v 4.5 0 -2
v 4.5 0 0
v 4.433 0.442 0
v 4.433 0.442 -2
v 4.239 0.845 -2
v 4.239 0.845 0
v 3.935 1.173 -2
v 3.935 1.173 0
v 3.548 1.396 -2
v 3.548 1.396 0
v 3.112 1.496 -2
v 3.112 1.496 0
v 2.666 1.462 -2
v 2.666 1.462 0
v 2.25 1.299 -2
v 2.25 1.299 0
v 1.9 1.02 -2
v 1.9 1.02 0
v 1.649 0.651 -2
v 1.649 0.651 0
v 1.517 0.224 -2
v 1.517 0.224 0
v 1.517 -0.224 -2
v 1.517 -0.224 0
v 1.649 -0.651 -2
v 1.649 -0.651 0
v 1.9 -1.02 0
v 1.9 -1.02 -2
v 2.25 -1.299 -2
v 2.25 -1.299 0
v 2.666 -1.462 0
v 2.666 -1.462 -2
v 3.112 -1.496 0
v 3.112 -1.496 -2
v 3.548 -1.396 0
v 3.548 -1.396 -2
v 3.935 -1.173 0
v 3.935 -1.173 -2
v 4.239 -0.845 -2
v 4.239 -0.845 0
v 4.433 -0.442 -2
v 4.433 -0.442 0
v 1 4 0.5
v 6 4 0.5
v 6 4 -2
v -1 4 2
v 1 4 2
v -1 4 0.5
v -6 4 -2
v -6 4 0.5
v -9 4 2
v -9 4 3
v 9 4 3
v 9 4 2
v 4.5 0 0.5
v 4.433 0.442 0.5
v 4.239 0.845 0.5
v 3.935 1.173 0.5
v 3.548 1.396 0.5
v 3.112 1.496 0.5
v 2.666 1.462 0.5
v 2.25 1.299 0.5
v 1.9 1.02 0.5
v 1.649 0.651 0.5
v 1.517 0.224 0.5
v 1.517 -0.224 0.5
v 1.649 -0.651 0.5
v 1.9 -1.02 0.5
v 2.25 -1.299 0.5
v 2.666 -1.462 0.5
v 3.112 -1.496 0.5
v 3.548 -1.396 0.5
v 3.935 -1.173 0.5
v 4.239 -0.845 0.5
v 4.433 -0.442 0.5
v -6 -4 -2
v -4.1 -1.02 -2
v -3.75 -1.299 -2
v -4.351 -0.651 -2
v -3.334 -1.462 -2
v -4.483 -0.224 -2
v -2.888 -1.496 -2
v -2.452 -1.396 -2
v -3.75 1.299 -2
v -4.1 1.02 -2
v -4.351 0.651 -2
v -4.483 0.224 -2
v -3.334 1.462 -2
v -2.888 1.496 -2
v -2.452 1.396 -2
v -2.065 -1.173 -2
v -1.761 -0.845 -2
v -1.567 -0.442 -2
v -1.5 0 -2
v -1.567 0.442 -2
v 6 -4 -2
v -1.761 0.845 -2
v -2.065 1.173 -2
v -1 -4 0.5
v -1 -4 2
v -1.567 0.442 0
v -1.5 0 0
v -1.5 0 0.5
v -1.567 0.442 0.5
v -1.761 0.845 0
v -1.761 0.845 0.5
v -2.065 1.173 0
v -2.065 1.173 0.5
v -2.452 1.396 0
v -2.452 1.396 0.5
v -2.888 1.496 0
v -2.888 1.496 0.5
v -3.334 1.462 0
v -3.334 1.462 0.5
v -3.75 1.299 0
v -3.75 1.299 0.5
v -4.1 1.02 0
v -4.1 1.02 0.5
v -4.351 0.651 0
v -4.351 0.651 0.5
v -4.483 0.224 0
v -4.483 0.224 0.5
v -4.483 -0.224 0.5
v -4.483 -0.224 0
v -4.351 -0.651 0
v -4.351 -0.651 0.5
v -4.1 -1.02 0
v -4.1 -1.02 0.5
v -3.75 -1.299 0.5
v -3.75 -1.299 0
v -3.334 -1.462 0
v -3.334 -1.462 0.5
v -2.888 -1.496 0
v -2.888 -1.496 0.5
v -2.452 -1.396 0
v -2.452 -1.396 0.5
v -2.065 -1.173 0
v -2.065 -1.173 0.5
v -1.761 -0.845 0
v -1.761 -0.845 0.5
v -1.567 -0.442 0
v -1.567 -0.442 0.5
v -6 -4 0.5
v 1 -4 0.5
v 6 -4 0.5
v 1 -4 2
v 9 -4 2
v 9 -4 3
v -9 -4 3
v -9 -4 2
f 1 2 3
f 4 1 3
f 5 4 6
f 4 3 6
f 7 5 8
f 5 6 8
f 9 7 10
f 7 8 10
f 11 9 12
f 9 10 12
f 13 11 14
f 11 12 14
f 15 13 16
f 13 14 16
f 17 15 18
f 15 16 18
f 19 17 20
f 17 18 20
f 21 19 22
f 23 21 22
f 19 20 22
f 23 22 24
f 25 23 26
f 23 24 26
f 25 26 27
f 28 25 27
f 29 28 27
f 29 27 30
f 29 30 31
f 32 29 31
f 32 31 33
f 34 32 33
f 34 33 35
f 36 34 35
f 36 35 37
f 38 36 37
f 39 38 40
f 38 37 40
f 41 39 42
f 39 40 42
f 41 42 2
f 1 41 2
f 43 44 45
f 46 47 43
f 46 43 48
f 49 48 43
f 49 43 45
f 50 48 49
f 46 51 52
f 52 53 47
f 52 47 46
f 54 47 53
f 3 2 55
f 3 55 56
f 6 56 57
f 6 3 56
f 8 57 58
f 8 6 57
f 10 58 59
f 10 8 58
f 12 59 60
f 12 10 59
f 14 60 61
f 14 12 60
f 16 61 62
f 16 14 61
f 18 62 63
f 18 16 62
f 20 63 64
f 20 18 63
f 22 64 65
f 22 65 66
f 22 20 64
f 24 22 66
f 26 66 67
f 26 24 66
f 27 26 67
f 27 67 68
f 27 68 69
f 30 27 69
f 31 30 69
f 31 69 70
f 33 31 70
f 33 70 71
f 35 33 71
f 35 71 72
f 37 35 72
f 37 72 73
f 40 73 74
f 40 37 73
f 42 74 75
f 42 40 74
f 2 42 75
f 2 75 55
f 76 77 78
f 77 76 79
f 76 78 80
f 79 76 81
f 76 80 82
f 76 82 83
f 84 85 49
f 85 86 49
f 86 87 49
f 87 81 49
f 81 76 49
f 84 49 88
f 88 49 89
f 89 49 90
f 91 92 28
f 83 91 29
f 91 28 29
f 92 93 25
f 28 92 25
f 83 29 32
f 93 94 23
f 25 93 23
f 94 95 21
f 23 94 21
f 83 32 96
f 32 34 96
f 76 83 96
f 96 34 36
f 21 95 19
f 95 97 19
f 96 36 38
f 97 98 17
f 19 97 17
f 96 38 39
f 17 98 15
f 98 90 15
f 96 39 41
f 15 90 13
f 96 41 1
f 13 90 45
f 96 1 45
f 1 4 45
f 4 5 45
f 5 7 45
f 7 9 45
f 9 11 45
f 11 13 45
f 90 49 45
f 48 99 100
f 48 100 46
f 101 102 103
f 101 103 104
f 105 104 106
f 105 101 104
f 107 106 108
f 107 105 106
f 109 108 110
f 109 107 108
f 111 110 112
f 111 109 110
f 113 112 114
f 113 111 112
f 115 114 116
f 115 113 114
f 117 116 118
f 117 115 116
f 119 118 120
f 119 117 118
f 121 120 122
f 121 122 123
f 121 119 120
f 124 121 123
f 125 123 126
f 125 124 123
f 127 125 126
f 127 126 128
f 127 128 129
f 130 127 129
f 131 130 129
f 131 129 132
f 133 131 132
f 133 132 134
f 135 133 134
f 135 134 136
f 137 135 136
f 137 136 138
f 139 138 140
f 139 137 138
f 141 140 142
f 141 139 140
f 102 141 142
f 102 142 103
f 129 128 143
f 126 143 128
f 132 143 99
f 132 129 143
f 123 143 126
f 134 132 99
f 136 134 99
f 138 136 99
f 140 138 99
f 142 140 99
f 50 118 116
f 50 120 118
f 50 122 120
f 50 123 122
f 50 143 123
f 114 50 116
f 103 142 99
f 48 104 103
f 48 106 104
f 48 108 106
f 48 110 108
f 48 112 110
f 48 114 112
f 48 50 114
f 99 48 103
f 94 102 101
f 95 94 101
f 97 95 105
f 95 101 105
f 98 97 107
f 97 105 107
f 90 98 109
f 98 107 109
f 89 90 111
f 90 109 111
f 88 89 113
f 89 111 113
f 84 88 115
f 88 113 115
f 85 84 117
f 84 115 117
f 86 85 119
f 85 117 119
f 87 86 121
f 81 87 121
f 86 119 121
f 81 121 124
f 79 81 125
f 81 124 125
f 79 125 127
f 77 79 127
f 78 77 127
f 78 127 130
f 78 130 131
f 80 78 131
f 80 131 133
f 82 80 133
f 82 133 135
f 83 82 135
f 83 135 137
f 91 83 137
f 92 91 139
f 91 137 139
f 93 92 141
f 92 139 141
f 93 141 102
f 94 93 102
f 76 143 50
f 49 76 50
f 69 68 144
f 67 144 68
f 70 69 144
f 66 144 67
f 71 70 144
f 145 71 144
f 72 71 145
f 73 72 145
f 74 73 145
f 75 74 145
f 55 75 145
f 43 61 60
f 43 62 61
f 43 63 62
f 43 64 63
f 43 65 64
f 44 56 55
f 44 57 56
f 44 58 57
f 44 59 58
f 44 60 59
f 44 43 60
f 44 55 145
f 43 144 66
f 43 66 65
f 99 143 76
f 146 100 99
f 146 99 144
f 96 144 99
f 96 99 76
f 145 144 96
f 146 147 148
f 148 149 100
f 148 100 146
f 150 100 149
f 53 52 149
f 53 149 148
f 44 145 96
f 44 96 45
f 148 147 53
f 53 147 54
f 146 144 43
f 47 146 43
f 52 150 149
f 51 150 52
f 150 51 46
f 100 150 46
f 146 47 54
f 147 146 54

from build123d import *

# Parameters (mm, degrees)
F0_W     = 5
F0_H     = 8
F0_R     = 1.5
F1_DEPTH = 0.5
F0_W_2   = 2
F2_DEPTH = 2
F4_W     = 18
F4_H     = 8
F5_DEPTH = 1
F6_DEPTH = 2


with BuildPart() as f1:
    # F0 (on Top) → F1 (new body)
    with BuildSketch(Plane.XY):
        with Locations((-3.5, 0)):
            Rectangle(F0_W, F0_H)
        with Locations((-3, 0)):
            Circle(F0_R, mode=Mode.SUBTRACT)
        with Locations((3.5, 0)):
            Rectangle(F0_W, F0_H)
        with Locations((3, 0)):
            Circle(F0_R, mode=Mode.SUBTRACT)
    extrude(amount=F1_DEPTH)

    # F0 (on Top) → F2 (join)
    with BuildSketch(Plane.XY):
        Rectangle(F0_W_2, F0_H)
    extrude(amount=F2_DEPTH)

    # F4 (on offset) → F5 (join)
    with BuildSketch(Plane.XY.offset(2)):
        Rectangle(F4_W, F4_H)
    extrude(amount=F5_DEPTH)

    # F0 (on Top) → F6 (join)
    with BuildSketch(Plane.XY):
        with Locations((-3.5, 0)):
            Rectangle(F0_W, F0_H)
        with Locations((-3, 0)):
            Circle(F0_R, mode=Mode.SUBTRACT)
        Rectangle(F0_W_2, F0_H)
        with Locations((3.5, 0)):
            Rectangle(F0_W, F0_H)
        with Locations((3, 0)):
            Circle(F0_R, mode=Mode.SUBTRACT)
    extrude(amount=-F6_DEPTH)


solid = f1.part
